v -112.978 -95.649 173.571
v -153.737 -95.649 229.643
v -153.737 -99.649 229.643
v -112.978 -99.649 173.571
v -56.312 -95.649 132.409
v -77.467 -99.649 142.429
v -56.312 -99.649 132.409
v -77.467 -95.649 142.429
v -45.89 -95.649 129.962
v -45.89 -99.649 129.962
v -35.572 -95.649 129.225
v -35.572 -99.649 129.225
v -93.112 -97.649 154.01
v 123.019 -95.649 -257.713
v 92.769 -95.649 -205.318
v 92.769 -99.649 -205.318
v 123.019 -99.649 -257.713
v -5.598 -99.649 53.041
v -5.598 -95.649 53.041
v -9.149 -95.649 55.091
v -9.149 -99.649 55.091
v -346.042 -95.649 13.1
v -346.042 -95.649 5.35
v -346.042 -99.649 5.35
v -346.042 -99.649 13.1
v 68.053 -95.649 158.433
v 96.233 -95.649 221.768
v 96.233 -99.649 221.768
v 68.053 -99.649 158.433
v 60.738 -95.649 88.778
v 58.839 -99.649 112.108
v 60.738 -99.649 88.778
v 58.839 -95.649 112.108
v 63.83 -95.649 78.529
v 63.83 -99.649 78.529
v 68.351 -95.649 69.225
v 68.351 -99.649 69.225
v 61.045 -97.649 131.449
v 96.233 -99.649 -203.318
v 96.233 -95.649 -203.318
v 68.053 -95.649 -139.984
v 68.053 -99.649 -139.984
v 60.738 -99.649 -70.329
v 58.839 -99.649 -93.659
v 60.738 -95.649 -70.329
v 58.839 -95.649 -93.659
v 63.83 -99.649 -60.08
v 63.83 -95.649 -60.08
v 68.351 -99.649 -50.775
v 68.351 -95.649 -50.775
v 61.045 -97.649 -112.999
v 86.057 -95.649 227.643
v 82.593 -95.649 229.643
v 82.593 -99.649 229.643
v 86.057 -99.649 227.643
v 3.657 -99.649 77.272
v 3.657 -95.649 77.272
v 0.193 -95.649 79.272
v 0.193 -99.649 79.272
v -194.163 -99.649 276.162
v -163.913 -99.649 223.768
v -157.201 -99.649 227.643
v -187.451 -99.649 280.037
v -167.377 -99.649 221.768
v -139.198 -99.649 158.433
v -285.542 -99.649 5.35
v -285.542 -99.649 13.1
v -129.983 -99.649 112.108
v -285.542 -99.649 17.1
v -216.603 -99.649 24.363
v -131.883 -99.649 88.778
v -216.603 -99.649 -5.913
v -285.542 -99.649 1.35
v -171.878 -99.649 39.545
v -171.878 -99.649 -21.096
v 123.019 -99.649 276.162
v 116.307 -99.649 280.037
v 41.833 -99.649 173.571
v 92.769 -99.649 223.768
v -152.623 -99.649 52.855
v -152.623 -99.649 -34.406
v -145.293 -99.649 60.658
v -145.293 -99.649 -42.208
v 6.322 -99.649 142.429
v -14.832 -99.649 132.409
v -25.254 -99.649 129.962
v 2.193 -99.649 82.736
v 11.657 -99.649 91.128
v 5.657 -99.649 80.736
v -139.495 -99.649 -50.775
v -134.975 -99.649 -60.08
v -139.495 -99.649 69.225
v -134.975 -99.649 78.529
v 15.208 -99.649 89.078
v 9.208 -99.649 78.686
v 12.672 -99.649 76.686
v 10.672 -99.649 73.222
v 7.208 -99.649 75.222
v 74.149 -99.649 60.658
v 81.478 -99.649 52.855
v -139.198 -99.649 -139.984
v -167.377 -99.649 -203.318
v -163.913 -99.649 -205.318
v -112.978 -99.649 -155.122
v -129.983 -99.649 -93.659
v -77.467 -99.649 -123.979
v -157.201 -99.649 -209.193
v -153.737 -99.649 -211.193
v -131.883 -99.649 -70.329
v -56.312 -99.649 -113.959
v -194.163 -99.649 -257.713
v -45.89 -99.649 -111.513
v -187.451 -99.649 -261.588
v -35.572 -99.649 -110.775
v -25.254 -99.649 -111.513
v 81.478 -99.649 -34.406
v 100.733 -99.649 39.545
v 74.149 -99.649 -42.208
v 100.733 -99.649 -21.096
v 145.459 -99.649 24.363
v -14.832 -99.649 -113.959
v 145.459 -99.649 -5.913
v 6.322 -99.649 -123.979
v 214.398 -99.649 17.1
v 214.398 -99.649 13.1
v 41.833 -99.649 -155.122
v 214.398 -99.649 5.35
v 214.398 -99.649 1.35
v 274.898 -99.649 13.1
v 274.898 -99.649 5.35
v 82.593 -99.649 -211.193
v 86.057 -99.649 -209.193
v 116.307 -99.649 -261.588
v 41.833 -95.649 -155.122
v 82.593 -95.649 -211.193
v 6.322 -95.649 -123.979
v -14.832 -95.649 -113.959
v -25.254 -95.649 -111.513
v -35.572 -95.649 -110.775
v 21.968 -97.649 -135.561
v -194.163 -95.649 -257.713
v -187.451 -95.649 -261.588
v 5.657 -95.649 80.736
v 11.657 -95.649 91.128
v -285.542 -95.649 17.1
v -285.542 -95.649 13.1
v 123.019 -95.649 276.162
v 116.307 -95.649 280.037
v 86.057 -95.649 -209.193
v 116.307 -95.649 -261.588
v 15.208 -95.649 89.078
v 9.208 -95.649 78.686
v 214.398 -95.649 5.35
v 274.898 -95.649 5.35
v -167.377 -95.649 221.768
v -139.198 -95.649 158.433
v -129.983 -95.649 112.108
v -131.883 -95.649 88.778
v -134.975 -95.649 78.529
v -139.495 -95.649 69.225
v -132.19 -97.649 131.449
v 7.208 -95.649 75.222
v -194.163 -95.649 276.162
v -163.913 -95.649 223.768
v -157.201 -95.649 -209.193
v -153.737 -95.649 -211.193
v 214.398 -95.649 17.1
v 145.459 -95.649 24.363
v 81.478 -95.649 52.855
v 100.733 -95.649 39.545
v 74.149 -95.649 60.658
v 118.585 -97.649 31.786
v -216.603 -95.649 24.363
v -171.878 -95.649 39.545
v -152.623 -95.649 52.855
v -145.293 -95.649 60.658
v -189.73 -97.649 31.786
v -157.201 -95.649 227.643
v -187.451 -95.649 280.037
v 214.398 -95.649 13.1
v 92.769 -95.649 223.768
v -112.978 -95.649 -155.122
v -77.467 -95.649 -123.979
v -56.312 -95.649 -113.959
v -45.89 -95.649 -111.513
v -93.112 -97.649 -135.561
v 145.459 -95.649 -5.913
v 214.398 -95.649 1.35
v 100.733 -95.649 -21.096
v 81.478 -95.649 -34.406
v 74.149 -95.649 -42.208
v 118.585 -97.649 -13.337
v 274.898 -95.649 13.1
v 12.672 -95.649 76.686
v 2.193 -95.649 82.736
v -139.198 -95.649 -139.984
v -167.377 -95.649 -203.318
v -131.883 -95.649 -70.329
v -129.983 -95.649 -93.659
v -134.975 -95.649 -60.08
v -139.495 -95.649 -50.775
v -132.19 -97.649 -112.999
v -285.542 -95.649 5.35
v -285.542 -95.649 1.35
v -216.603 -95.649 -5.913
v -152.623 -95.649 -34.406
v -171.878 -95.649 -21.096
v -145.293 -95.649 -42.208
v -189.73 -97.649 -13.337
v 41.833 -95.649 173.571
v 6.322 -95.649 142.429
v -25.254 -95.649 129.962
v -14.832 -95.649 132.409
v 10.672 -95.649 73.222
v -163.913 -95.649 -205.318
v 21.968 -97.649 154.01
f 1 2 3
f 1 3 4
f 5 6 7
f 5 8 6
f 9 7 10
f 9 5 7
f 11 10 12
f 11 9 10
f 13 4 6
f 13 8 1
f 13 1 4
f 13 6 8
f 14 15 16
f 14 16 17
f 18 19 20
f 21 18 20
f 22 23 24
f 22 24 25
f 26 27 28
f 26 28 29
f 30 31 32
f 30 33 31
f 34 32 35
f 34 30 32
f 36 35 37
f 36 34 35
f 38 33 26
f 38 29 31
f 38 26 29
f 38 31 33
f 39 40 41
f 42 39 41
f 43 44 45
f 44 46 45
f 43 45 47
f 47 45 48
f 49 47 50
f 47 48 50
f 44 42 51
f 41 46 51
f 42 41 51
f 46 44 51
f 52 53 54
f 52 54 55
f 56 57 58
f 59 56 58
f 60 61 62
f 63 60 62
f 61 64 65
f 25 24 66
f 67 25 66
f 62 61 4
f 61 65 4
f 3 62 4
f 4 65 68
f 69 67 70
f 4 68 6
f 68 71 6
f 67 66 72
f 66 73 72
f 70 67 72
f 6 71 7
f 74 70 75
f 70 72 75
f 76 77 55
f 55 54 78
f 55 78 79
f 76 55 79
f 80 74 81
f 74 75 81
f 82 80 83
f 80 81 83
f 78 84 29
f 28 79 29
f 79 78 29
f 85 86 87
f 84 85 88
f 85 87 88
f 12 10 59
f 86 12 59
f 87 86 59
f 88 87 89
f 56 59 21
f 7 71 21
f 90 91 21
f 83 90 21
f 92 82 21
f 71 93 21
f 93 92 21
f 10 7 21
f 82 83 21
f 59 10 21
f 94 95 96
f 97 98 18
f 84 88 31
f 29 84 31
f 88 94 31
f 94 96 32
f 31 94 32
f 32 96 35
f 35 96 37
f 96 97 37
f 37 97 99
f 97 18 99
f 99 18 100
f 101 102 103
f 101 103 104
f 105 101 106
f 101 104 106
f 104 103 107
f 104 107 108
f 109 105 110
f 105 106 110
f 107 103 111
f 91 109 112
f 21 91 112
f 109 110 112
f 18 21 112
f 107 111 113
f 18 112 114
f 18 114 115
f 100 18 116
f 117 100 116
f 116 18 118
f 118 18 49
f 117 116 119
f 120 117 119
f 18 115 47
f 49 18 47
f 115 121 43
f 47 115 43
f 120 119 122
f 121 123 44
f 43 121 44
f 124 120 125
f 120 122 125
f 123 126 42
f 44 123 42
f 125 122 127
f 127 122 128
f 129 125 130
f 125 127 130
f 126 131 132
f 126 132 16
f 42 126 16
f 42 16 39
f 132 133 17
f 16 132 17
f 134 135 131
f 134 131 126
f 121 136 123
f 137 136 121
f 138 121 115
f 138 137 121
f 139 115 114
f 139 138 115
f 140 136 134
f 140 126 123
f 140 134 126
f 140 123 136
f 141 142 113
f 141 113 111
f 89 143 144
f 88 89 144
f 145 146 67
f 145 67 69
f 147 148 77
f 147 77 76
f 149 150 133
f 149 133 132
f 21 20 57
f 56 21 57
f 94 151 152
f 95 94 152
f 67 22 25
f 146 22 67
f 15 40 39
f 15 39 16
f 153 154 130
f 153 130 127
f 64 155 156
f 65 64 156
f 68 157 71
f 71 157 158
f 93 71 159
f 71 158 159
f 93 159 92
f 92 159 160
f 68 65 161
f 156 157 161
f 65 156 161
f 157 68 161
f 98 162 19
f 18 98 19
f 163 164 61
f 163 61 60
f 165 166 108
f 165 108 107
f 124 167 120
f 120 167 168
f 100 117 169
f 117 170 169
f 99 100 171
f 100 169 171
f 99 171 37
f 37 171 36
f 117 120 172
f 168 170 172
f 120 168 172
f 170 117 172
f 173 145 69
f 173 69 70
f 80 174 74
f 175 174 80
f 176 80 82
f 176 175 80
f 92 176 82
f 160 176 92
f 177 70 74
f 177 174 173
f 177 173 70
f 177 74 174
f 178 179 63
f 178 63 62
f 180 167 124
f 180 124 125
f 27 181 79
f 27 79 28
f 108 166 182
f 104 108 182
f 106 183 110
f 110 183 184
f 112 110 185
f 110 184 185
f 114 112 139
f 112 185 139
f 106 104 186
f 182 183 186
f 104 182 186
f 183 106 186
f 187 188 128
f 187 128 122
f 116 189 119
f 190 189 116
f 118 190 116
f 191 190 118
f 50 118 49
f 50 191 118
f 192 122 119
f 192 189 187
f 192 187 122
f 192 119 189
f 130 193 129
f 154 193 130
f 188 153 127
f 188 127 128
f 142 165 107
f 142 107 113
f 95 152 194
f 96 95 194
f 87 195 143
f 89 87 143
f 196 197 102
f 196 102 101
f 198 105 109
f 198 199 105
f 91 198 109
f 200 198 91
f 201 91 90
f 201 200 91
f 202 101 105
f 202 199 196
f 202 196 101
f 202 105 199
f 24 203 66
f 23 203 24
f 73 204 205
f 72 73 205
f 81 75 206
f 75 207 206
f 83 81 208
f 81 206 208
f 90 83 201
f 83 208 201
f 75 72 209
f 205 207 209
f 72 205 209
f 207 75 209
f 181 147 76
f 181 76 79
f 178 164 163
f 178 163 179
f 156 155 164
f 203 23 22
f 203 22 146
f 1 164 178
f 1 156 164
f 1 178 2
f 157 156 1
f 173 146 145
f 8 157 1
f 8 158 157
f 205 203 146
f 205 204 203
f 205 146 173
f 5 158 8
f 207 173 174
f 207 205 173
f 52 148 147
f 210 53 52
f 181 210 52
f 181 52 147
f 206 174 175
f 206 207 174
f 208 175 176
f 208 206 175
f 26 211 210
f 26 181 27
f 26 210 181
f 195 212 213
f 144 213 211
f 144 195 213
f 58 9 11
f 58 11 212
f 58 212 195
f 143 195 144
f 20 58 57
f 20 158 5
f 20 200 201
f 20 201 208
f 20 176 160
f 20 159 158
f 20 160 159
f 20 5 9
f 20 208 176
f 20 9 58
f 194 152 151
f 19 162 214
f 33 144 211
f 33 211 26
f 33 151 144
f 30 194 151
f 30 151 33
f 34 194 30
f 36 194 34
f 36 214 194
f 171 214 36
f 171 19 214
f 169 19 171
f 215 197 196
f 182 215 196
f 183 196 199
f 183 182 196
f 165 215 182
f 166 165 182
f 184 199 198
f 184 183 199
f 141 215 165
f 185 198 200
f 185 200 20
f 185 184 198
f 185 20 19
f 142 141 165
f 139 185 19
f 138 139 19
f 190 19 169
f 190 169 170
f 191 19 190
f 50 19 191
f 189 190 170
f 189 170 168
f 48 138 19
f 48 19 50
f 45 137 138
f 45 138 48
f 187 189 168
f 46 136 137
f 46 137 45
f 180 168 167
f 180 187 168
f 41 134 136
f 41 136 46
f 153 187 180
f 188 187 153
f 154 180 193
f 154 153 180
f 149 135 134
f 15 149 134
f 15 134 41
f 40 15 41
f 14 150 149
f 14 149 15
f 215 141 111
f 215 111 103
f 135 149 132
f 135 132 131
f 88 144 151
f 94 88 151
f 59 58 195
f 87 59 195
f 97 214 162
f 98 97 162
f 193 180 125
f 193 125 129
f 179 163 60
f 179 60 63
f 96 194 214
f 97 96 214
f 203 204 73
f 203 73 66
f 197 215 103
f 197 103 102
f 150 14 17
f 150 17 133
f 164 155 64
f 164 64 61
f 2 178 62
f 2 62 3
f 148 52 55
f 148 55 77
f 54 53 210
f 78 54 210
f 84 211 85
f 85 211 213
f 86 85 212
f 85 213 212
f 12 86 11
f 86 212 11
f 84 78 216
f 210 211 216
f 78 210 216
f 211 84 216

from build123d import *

# Parameters (mm, degrees)
BOSS_EXTRUDE1_DEPTH = 4


with BuildPart() as part:
    # Sketch1 → Boss-Extrude1 (new body)
    with BuildSketch(Plane(origin=(0, -95.648578892, 0), x_dir=(-1, 0, 0), z_dir=(0, -1, 0))):
        with BuildLine():
            Line((-123.018568843, 257.712687792), (-116.306871964, 261.587687792))
            Line((-116.306871964, 261.587687792), (-86.056888913, 209.19318022))
            Line((-86.056888913, 209.19318022), (-82.592787298, 211.19318022))
            add(Edge.make_bspline(
                [(-82.592787298, 211.19318022), (-20.425563037, 110.136816529), (35.572246121, 110.775338662)],
                knots=[0, 0, 0, 1, 1, 1], degree=2))
            add(Edge.make_bspline(
                [(153.737279537, 211.193180221), (91.570055279, 110.136816529), (35.572246121, 110.775338662)],
                knots=[0, 0, 0, 1, 1, 1], degree=2))
            Line((153.737279537, 211.193180221), (157.201381153, 209.193180221))
            Line((157.201381153, 209.193180221), (187.451364204, 261.587687793))
            Line((187.451364204, 261.587687793), (194.163061083, 257.712687793))
            Line((194.163061083, 257.712687793), (163.913078032, 205.318180221))
            Line((163.913078032, 205.318180221), (167.377179647, 203.318180221))
            add(Edge.make_bspline(
                [(167.377179647, 203.318180221), (110.943413608, 98.951602883), (139.495294576, 50.775338663)],
                knots=[0, 0, 0, 1, 1, 1], degree=2))
            add(Edge.make_bspline(
                [(285.542213066, -1.349661336), (166.941222766, 1.960552309), (139.495294576, 50.775338663)],
                knots=[0, 0, 0, 1, 1, 1], degree=2))
            Line((285.542213066, -1.349661336), (285.542213066, -5.349661336))
            Line((285.542213066, -5.349661336), (346.042179168, -5.349661336))
            Line((346.042179168, -5.349661336), (346.042179168, -13.099661336))
            Line((346.042179168, -13.099661336), (285.542213066, -13.099661336))
            Line((285.542213066, -13.099661336), (285.542213066, -17.099661336))
            add(Edge.make_bspline(
                [(285.542213066, -17.099661336), (166.941222766, -20.409874983), (139.495294576, -69.224661337)],
                knots=[0, 0, 0, 1, 1, 1], degree=2))
            add(Edge.make_bspline(
                [(167.377179649, -221.767502894), (110.943413609, -117.400925558), (139.495294576, -69.224661337)],
                knots=[0, 0, 0, 1, 1, 1], degree=2))
            Line((167.377179649, -221.767502894), (163.913078034, -223.767502894))
            Line((163.913078034, -223.767502894), (194.163061085, -276.162010466))
            Line((194.163061085, -276.162010466), (187.451364206, -280.037010466))
            Line((187.451364206, -280.037010466), (157.201381155, -227.642502894))
            Line((157.201381155, -227.642502894), (153.737279539, -229.642502894))
            add(Edge.make_bspline(
                [(153.737279539, -229.642502894), (91.57005528, -128.586139204), (35.572246122, -129.224661338)],
                knots=[0, 0, 0, 1, 1, 1], degree=2))
            add(Edge.make_bspline(
                [(-82.592787296, -229.642502896), (-20.425563036, -128.586139204), (35.572246122, -129.224661338)],
                knots=[0, 0, 0, 1, 1, 1], degree=2))
            Line((-82.592787296, -229.642502896), (-86.056888911, -227.642502895))
            Line((-86.056888911, -227.642502895), (-116.306871962, -280.037010467))
            Line((-116.306871962, -280.037010467), (-123.018568841, -276.162010467))
            Line((-123.018568841, -276.162010467), (-92.76858579, -223.767502895))
            Line((-92.76858579, -223.767502895), (-96.232687406, -221.767502895))
            add(Edge.make_bspline(
                [(-96.232687406, -221.767502895), (-39.798921364, -117.400925558), (-68.350802332, -69.224661338)],
                knots=[0, 0, 0, 1, 1, 1], degree=2))
            add(Edge.make_bspline(
                [(-214.397720824, -17.099661339), (-95.796730523, -20.409874984), (-68.350802332, -69.224661338)],
                knots=[0, 0, 0, 1, 1, 1], degree=2))
            Line((-214.397720824, -17.099661339), (-214.397720824, -13.099661338))
            Line((-214.397720824, -13.099661338), (-274.897686926, -13.099661338))
            Line((-274.897686926, -13.099661338), (-274.897686926, -5.349661338))
            Line((-274.897686926, -5.349661338), (-214.397720824, -5.349661338))
            Line((-214.397720824, -5.349661338), (-214.397720824, -1.349661338))
            add(Edge.make_bspline(
                [(-214.397720824, -1.349661338), (-95.796730523, 1.960552308), (-68.350802333, 50.775338662)],
                knots=[0, 0, 0, 1, 1, 1], degree=2))
            add(Edge.make_bspline(
                [(-96.232687408, 203.31818022), (-39.798921365, 98.951602882), (-68.350802333, 50.775338662)],
                knots=[0, 0, 0, 1, 1, 1], degree=2))
            Line((-96.232687408, 203.31818022), (-92.768585792, 205.31818022))
            Line((-92.768585792, 205.31818022), (-123.018568843, 257.712687792))
        make_face()
        Polygon((9.149169363, -55.090772776), (-3.656970853, -77.271658278), (-0.192869237, -79.271658278), (-2.192869237, -82.735759893), (-5.656970853, -80.735759893), (-11.656970853, -91.128064739), (-15.207675008, -89.078064739), (-9.207675008, -78.685759893), (-12.671776623, -76.685759893), (-10.671776623, -73.221658278), (-7.207675008, -75.221658278), (5.598465207, -53.040772776), align=None, mode=Mode.SUBTRACT)
    extrude(amount=BOSS_EXTRUDE1_DEPTH)


solid = part.part
